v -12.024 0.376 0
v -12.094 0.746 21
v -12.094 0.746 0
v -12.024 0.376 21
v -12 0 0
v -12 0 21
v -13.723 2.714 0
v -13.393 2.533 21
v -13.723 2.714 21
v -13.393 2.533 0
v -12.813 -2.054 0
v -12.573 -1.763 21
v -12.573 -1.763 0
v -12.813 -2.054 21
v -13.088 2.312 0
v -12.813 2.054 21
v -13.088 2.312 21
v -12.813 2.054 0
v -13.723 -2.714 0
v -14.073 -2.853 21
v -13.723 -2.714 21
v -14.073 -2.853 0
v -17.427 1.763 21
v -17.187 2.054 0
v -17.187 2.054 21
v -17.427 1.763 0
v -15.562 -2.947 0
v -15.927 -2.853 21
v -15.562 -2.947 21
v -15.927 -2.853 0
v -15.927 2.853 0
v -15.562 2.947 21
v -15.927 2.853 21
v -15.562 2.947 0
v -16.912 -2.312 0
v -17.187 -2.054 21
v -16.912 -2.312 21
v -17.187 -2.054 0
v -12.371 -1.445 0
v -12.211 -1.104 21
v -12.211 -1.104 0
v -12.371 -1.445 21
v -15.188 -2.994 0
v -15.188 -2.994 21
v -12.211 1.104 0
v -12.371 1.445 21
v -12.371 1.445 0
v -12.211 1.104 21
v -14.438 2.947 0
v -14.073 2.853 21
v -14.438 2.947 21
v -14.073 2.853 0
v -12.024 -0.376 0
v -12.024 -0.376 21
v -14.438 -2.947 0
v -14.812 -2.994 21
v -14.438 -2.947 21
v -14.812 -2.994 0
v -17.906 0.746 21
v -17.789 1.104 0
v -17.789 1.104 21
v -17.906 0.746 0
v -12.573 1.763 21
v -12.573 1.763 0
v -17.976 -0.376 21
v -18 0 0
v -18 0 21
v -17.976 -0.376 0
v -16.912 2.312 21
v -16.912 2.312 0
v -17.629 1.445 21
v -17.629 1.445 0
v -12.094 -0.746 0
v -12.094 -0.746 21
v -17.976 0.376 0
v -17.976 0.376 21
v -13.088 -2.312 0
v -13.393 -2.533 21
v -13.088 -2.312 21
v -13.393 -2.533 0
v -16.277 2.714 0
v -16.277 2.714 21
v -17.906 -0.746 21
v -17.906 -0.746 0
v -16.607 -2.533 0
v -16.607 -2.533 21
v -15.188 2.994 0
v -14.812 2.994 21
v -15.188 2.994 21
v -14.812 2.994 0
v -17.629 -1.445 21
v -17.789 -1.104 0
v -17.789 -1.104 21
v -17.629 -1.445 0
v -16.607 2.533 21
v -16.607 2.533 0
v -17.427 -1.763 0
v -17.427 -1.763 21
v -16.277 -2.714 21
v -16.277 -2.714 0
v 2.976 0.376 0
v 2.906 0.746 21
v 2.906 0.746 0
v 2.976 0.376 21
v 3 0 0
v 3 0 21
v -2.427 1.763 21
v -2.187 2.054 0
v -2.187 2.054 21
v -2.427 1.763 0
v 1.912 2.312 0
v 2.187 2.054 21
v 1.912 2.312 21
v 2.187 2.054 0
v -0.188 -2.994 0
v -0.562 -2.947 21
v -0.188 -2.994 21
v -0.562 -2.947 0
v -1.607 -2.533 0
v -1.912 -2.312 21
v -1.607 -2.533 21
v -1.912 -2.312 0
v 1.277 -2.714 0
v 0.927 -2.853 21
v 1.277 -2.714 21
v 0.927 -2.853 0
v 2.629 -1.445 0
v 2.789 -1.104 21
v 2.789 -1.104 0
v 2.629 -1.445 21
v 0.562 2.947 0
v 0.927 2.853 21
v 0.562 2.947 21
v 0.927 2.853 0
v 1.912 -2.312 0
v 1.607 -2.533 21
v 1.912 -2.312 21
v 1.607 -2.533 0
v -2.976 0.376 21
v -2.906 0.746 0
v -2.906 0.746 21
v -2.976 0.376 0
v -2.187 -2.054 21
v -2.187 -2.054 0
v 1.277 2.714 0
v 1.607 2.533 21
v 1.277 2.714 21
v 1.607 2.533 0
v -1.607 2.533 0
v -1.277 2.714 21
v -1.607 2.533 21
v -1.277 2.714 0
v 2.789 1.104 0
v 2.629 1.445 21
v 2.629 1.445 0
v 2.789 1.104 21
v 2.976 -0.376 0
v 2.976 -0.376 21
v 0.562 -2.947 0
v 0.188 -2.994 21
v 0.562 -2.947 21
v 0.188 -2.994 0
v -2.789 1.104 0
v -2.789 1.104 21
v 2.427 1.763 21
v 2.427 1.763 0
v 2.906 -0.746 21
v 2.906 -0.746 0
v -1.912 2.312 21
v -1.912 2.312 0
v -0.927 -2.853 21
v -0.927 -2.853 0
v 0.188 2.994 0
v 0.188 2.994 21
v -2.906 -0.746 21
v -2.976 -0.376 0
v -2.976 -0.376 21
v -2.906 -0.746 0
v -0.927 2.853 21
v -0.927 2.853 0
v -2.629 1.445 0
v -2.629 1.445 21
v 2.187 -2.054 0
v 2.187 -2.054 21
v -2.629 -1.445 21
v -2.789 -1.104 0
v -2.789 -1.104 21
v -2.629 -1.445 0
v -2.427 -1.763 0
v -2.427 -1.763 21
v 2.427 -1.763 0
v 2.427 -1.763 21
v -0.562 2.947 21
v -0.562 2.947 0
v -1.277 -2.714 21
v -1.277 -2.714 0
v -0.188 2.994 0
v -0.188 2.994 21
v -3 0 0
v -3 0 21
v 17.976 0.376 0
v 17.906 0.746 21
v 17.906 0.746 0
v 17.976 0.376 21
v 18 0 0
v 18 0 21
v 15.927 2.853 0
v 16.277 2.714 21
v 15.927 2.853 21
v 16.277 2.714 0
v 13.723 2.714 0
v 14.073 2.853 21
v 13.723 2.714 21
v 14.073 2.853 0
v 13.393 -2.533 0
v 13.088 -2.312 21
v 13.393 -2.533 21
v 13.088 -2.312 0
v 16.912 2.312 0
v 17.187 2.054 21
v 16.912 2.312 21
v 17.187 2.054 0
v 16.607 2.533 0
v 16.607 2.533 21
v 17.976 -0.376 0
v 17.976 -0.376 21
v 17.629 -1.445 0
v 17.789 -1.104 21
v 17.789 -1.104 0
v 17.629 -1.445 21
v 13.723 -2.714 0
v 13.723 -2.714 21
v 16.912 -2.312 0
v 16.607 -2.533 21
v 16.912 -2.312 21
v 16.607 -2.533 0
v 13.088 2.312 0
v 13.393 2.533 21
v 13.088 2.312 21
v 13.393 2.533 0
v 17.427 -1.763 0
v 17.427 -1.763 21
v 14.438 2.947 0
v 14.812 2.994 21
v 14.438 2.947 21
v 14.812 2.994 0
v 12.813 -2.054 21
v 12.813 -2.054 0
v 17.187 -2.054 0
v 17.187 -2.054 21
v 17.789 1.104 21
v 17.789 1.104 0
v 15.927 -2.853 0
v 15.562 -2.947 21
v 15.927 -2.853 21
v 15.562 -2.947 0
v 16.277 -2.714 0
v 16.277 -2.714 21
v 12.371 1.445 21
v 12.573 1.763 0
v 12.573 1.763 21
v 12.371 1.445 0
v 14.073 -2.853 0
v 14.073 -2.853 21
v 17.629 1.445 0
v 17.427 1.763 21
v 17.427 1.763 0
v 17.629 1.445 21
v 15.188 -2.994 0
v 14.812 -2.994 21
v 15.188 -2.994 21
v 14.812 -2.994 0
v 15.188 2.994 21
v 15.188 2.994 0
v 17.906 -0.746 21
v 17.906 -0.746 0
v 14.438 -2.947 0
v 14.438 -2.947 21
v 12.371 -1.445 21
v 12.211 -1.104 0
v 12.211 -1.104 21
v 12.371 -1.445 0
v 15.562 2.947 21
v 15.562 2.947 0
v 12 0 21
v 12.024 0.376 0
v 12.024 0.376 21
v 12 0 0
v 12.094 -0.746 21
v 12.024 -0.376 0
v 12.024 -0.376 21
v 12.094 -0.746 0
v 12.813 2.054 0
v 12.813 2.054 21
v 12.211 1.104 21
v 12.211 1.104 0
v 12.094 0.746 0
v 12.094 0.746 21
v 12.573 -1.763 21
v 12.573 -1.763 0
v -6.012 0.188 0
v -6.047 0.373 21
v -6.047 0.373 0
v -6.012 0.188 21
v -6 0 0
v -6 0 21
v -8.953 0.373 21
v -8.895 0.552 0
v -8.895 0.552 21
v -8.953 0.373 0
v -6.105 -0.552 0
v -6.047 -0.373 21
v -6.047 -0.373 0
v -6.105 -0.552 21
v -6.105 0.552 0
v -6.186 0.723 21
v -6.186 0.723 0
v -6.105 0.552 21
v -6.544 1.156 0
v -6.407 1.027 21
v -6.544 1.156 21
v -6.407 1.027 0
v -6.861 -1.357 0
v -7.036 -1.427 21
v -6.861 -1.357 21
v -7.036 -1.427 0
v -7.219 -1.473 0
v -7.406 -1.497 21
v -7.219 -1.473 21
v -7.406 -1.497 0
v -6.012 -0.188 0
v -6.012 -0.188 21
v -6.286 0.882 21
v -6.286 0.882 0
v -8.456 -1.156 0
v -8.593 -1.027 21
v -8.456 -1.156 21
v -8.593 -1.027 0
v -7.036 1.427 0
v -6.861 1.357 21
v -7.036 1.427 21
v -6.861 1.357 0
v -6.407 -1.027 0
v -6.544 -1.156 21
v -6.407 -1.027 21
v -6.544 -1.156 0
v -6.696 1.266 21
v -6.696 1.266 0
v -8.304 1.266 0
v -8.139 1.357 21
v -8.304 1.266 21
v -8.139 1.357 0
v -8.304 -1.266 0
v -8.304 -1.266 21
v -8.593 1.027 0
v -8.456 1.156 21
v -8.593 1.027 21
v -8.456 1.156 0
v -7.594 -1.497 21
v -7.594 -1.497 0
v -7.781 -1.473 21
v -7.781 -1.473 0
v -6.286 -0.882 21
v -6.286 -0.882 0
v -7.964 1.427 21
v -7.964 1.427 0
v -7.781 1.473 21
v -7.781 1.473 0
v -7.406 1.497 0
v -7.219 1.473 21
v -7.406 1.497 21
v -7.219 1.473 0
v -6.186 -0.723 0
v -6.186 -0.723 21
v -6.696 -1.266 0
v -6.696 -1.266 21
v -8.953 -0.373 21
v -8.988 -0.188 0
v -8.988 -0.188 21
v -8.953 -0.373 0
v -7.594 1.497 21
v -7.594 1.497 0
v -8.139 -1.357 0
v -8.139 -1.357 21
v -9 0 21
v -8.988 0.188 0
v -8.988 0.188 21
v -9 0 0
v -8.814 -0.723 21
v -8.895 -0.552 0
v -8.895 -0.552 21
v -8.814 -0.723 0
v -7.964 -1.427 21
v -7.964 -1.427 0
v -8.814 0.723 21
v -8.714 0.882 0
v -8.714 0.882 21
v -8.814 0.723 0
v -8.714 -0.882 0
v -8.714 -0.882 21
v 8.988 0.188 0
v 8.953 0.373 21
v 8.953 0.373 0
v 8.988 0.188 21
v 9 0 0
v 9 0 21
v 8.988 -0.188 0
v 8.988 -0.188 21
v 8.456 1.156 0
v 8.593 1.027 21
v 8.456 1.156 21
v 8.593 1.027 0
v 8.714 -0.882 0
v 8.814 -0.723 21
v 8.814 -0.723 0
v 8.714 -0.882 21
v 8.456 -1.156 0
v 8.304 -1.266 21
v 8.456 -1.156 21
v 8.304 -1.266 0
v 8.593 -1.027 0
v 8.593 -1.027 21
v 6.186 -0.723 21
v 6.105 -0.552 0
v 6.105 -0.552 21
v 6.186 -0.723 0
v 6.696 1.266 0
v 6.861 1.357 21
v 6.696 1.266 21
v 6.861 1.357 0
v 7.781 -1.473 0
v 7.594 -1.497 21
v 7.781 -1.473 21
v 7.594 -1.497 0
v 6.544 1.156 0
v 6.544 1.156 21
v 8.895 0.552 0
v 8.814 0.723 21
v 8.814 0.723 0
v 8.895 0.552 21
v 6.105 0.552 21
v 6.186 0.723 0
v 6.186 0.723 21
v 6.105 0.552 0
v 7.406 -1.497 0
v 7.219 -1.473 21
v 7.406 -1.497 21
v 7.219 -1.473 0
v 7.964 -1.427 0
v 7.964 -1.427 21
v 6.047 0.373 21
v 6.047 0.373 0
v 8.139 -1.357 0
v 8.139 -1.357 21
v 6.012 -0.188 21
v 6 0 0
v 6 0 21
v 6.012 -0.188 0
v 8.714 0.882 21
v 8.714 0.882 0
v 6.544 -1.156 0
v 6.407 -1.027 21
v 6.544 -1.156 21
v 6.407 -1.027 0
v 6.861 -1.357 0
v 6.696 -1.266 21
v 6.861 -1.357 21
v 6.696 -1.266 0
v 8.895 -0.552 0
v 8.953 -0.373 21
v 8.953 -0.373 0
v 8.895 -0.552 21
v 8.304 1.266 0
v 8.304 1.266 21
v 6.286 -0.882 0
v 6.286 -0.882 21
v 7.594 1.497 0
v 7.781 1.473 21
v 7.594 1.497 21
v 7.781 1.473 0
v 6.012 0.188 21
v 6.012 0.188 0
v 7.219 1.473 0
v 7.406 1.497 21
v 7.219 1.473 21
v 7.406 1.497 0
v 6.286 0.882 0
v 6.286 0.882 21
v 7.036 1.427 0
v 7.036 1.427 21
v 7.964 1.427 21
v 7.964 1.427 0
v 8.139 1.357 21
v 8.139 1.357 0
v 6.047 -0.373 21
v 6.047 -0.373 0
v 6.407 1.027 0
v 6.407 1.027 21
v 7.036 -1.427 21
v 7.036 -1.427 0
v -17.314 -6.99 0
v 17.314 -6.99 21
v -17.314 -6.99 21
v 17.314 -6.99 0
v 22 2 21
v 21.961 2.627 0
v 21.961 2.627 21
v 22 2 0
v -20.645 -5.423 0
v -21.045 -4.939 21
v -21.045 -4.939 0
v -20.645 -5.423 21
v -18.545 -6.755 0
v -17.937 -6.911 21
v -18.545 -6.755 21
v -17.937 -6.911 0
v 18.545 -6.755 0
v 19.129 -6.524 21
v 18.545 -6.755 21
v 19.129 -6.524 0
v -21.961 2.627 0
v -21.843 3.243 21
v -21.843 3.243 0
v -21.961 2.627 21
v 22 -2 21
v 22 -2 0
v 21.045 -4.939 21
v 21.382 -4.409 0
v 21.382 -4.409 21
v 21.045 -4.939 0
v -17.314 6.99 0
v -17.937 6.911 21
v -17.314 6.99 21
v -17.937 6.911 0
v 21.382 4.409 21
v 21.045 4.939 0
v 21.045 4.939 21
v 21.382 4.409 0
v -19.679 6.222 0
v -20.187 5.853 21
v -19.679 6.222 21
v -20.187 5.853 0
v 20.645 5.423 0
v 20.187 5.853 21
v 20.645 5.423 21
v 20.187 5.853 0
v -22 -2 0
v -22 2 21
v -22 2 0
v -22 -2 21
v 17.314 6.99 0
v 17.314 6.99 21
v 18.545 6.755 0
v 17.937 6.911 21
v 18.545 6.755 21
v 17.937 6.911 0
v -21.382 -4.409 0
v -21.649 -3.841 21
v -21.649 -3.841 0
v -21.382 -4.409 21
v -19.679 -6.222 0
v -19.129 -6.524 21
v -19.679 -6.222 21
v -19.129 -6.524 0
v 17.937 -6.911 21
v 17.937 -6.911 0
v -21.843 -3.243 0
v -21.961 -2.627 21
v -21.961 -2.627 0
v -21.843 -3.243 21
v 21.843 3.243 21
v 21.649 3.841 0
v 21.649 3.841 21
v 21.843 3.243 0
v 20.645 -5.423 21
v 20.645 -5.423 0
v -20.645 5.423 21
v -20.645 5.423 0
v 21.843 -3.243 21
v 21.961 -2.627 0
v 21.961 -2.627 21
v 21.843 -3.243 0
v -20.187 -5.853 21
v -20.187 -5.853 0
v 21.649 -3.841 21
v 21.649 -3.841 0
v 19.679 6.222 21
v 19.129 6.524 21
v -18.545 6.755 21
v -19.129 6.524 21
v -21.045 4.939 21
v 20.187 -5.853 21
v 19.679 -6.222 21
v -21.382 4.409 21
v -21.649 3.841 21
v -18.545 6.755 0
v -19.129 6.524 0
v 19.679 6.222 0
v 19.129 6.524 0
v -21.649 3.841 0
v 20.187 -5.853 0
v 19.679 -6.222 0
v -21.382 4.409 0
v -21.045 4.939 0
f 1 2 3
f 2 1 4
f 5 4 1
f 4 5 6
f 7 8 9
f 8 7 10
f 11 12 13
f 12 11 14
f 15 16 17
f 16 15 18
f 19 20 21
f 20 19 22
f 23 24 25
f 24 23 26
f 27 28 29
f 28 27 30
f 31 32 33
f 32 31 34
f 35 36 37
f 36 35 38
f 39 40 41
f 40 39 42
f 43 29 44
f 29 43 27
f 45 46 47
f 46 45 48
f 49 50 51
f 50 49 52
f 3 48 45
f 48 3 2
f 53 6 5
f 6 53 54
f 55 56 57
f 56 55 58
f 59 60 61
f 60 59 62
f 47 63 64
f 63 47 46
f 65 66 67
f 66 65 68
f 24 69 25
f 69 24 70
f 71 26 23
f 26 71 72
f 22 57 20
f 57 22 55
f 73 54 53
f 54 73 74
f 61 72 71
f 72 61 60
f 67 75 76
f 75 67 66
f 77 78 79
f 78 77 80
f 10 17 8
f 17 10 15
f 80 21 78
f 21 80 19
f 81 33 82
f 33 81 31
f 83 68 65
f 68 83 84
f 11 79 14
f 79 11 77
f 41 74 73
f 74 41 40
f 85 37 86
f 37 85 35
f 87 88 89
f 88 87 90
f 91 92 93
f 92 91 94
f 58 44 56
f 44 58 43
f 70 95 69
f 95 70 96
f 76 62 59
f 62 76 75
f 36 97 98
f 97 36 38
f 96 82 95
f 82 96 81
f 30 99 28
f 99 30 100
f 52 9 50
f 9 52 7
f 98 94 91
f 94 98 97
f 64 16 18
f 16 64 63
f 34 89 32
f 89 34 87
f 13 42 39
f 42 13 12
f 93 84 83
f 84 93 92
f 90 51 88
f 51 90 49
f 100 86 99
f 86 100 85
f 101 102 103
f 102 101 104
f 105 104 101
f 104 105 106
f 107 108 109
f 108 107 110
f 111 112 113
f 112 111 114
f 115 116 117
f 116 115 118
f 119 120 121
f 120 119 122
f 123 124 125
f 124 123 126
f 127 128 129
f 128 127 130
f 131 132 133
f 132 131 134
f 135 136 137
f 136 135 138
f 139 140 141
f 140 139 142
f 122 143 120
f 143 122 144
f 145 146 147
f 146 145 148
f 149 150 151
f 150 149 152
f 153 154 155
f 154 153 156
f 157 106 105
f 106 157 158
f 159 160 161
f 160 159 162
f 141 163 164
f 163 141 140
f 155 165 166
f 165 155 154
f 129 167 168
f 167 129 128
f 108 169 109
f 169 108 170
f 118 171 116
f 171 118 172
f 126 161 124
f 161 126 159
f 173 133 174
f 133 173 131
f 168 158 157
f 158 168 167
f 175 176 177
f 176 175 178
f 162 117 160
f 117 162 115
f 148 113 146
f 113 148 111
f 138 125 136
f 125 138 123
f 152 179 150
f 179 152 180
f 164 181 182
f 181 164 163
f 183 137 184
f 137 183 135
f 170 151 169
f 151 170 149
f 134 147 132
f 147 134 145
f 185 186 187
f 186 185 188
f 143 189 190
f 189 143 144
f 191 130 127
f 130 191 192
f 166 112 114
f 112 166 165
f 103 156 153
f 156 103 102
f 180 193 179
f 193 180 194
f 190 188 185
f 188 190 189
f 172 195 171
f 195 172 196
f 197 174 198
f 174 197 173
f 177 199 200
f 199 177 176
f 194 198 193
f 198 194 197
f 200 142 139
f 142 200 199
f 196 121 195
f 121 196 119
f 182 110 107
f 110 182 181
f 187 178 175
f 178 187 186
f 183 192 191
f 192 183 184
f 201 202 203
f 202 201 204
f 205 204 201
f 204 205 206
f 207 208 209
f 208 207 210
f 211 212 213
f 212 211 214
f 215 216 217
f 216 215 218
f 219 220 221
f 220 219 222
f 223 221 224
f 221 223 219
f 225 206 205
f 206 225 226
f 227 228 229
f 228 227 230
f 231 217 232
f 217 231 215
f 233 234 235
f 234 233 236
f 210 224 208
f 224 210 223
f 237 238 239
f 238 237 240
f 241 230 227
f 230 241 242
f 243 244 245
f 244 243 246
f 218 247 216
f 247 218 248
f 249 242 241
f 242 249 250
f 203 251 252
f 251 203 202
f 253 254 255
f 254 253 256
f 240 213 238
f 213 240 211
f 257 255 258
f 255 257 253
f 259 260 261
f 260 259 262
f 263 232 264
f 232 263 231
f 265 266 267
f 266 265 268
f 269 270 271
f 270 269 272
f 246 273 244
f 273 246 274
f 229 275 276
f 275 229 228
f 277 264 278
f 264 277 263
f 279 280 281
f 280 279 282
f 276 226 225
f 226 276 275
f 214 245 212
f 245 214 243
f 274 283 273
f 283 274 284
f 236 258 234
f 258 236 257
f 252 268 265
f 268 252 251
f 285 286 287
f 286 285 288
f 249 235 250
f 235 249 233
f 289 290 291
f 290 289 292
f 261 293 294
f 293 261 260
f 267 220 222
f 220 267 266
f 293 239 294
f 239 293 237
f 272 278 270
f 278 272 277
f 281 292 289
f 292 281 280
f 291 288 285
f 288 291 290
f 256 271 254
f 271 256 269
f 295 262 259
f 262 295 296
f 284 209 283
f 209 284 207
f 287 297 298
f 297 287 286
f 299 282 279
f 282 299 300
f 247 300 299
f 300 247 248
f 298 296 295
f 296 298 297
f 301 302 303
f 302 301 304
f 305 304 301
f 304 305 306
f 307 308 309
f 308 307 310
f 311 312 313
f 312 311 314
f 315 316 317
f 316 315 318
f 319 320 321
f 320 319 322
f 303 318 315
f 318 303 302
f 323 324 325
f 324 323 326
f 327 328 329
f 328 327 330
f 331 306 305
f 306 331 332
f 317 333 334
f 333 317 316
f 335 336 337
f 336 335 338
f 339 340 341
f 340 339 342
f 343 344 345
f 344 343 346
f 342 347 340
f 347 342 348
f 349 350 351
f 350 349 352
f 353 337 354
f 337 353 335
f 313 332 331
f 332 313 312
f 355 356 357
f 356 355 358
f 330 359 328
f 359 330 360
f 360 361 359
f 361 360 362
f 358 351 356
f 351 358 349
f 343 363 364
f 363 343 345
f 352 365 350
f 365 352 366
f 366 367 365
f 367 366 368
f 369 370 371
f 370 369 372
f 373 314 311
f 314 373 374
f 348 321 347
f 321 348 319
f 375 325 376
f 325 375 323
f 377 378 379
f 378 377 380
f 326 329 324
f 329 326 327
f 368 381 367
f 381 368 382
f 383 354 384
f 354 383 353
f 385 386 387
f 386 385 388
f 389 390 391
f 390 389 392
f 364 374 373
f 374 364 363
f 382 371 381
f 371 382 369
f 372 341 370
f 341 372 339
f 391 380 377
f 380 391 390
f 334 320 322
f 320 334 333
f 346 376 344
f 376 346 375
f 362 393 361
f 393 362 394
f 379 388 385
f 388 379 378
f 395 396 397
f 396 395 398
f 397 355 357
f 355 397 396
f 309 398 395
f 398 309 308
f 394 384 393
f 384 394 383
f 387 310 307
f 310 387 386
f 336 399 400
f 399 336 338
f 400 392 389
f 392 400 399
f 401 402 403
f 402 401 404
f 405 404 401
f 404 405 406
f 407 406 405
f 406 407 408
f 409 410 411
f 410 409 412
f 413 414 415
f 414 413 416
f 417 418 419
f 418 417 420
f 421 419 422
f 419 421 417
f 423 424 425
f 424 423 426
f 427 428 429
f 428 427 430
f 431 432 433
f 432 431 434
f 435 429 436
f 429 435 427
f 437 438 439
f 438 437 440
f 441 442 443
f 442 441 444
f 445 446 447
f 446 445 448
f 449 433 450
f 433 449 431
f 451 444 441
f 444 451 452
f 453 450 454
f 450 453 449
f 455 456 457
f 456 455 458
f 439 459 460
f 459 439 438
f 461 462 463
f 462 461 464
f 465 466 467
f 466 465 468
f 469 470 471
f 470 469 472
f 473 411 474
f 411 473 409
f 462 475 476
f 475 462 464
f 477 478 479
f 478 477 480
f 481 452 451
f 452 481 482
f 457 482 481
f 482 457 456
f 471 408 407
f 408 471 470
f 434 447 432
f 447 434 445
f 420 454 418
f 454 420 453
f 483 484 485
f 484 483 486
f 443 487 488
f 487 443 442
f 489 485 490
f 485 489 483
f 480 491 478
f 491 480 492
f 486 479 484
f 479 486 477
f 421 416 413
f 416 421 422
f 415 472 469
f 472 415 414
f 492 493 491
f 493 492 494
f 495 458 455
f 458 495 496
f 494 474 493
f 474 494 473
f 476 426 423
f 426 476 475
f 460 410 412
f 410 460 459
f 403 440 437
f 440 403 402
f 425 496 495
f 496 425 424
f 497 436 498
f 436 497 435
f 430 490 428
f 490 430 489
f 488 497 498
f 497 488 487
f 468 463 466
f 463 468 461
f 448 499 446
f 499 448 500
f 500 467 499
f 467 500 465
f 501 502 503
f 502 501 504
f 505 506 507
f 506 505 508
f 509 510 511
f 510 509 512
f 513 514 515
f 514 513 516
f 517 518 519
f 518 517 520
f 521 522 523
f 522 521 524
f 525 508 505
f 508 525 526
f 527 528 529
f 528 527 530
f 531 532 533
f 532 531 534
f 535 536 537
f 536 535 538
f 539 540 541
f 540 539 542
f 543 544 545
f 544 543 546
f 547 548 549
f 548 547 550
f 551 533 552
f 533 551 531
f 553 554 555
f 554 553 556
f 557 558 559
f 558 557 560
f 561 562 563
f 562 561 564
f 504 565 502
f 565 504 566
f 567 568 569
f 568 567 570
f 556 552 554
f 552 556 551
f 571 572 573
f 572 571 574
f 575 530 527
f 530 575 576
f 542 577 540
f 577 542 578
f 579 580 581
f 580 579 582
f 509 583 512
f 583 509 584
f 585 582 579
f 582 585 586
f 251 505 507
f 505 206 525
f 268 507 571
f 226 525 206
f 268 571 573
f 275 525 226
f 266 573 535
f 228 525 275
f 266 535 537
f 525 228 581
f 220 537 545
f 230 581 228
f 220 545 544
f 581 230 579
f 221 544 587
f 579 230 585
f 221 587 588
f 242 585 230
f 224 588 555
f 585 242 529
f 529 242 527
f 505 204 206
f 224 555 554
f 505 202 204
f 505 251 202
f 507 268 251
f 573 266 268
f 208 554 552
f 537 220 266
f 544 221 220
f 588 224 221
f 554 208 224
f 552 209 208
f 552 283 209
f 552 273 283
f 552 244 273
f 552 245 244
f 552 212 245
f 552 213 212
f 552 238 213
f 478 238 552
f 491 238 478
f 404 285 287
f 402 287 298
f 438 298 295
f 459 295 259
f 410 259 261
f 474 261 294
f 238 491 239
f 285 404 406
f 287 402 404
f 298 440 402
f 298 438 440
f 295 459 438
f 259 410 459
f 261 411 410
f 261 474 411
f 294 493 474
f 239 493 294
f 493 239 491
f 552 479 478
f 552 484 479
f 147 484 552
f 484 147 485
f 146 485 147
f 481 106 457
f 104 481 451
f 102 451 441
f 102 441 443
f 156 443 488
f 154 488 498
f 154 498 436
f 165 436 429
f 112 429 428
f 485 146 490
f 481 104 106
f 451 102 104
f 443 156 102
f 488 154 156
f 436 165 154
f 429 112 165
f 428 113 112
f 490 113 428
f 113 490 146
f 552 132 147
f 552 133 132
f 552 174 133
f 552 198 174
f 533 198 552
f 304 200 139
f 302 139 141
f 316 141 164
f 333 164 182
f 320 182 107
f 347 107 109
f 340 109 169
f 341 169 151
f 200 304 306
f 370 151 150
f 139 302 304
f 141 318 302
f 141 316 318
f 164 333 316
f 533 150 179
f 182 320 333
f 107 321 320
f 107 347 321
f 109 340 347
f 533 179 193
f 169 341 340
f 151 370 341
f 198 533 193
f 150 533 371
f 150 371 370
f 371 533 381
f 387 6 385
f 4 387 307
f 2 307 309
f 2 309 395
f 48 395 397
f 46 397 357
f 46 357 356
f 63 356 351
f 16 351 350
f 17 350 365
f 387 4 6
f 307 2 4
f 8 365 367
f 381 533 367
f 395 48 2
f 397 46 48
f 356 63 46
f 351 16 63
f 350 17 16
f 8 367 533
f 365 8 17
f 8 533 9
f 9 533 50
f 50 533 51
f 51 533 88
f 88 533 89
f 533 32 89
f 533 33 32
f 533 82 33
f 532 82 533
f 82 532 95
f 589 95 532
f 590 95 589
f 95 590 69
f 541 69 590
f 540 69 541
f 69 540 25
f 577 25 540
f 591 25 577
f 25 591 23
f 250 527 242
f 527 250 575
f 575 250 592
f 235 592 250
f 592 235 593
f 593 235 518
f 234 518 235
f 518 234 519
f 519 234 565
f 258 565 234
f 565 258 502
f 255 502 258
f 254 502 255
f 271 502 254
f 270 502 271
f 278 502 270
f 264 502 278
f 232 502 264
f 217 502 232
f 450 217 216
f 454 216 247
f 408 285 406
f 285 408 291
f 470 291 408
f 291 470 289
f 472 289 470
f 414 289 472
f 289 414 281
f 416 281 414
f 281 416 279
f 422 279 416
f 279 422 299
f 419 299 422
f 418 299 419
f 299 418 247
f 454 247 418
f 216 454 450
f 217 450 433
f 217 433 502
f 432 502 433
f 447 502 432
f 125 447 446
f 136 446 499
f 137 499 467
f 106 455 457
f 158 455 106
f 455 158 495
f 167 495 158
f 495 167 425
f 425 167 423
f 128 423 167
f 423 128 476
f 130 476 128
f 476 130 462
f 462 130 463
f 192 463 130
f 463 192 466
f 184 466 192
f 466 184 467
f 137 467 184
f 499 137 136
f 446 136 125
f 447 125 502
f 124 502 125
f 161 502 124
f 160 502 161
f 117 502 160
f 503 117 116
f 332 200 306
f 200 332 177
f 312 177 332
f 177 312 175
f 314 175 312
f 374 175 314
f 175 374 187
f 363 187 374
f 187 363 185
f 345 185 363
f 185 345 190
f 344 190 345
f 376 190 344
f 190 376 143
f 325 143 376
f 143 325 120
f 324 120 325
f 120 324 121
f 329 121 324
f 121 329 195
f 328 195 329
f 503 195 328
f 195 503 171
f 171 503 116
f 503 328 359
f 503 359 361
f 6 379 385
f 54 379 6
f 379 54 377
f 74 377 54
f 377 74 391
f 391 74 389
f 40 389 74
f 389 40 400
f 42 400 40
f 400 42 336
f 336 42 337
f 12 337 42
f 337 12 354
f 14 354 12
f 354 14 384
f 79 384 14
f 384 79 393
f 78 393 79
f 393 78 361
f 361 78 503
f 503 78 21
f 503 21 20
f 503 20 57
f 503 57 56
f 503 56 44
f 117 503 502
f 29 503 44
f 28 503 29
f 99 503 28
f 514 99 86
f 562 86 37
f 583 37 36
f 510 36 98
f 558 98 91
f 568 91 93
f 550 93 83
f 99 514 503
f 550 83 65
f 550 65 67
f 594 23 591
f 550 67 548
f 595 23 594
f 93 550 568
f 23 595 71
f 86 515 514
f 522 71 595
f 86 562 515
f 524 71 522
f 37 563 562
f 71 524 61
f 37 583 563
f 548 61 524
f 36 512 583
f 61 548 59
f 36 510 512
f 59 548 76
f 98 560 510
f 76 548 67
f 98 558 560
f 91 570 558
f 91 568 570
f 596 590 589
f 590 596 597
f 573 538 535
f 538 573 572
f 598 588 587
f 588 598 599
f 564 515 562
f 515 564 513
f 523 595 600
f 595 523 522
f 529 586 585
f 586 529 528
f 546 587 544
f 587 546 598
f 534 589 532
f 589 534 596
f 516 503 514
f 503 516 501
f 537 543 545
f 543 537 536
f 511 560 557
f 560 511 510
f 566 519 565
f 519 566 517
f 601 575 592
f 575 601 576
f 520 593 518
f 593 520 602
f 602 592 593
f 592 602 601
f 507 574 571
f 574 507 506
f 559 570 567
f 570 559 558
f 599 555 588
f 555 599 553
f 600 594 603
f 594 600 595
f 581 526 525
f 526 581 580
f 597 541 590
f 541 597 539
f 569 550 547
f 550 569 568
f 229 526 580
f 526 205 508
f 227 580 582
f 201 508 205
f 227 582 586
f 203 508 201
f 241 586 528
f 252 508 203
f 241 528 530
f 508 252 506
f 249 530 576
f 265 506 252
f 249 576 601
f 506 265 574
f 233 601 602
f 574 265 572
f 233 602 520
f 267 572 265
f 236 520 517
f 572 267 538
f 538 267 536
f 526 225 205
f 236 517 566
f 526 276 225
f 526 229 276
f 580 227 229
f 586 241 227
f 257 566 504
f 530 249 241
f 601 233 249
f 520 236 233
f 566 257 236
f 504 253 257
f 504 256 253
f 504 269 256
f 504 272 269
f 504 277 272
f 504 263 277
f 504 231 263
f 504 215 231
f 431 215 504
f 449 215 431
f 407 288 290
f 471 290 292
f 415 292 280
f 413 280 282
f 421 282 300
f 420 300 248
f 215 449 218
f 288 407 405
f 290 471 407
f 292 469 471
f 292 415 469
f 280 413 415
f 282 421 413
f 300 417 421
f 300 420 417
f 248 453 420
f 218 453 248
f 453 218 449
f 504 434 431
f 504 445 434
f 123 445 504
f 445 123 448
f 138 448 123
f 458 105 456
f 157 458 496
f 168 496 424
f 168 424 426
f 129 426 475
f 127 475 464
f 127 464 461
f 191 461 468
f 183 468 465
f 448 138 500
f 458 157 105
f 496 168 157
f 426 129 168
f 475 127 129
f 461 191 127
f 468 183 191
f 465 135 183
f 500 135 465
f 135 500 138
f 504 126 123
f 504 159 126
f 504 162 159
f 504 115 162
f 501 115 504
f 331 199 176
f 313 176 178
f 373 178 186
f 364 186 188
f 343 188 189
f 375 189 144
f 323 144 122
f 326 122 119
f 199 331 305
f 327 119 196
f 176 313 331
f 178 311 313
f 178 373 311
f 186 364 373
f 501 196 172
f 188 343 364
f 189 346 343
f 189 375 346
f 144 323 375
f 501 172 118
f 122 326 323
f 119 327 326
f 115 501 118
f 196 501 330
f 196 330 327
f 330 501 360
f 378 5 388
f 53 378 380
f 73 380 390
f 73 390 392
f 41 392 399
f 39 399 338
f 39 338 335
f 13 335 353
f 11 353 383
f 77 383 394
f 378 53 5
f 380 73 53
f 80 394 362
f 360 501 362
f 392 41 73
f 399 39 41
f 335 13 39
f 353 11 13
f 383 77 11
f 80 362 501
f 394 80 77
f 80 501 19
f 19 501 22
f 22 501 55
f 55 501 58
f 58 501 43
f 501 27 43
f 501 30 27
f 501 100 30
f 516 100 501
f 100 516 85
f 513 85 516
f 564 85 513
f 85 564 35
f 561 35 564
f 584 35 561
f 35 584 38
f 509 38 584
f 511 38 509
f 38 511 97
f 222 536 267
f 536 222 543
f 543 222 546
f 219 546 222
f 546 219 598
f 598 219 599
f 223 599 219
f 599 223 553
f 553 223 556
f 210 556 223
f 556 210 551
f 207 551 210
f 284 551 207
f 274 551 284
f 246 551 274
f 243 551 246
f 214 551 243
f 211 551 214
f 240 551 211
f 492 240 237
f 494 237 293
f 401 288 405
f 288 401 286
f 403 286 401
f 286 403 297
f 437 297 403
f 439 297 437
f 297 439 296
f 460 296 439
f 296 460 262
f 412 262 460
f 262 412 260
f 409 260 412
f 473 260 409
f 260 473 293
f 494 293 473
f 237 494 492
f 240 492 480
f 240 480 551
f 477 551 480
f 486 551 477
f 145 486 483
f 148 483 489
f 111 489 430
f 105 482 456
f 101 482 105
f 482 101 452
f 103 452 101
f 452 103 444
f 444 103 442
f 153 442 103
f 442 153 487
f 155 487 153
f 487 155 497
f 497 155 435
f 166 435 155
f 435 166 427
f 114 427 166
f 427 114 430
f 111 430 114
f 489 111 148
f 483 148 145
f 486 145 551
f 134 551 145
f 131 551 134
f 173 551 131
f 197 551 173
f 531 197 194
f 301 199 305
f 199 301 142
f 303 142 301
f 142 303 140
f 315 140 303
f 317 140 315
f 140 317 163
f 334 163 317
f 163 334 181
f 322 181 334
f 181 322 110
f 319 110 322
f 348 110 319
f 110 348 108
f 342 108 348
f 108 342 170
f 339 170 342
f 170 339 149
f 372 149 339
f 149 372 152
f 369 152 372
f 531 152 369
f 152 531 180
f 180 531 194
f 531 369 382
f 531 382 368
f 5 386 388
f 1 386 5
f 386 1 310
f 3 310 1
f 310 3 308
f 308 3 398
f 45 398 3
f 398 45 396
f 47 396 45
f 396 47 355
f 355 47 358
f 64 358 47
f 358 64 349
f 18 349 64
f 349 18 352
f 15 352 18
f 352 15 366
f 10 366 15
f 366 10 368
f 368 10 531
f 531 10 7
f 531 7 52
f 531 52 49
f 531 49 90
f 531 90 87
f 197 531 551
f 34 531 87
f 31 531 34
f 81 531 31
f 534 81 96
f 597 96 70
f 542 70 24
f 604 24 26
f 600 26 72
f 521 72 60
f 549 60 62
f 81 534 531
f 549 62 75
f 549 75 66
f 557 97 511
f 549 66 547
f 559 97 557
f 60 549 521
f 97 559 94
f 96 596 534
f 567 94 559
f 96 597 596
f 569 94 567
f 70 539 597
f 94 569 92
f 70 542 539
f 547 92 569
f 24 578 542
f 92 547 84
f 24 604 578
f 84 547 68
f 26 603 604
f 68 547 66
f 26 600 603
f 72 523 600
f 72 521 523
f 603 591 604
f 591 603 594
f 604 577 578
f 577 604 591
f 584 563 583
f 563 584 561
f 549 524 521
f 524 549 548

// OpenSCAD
$fn = 50;


difference() {
	union() {
		*color(alpha = 1.0000000000, c = "gray") {
			translate(v = [0, 7, 0]) {
				linear_extrude(height = 1) {
					text(font = "Arial:style=Bold", halign = "center", size = 4.5000000000, text = "COMMENT plate main", valign = "center");
				}
			}
		}
		hull() {
			translate(v = [-17.0000000000, 2.0000000000, 0]) {
				cylinder(h = 21, r = 5);
			}
			translate(v = [17.0000000000, 2.0000000000, 0]) {
				cylinder(h = 21, r = 5);
			}
			translate(v = [-17.0000000000, -2.0000000000, 0]) {
				cylinder(h = 21, r = 5);
			}
			translate(v = [17.0000000000, -2.0000000000, 0]) {
				cylinder(h = 21, r = 5);
			}
		}
	}
	union() {
		*color(alpha = 1.0000000000, c = "gray") {
			translate(v = [0, 7, 0]) {
				linear_extrude(height = 1) {
					text(font = "Arial:style=Bold", halign = "center", size = 4.5000000000, text = "COMMENT holes main", valign = "center");
				}
			}
		}
		translate(v = [-15.0000000000, 0.0000000000, 0]) {
			translate(v = [0, 0, -100]) {
				cylinder(h = 200, r = 3.0000000000);
			}
		}
		translate(v = [0, 0, -100]) {
			cylinder(h = 200, r = 3.0000000000);
		}
		translate(v = [15.0000000000, 0.0000000000, 0]) {
			translate(v = [0, 0, -100]) {
				cylinder(h = 200, r = 3.0000000000);
			}
		}
		translate(v = [-15.0000000000, 0.0000000000, 0]) {
			translate(v = [0, 0, -100]) {
				cylinder(h = 200, r = 1.5000000000);
			}
		}
		translate(v = [-7.5000000000, 0.0000000000, 0]) {
			translate(v = [0, 0, -100]) {
				cylinder(h = 200, r = 1.5000000000);
			}
		}
		translate(v = [0, 0, -100]) {
			cylinder(h = 200, r = 1.5000000000);
		}
		translate(v = [7.5000000000, 0.0000000000, 0]) {
			translate(v = [0, 0, -100]) {
				cylinder(h = 200, r = 1.5000000000);
			}
		}
		translate(v = [15.0000000000, 0.0000000000, 0]) {
			translate(v = [0, 0, -100]) {
				cylinder(h = 200, r = 1.5000000000);
			}
		}
	}
}
